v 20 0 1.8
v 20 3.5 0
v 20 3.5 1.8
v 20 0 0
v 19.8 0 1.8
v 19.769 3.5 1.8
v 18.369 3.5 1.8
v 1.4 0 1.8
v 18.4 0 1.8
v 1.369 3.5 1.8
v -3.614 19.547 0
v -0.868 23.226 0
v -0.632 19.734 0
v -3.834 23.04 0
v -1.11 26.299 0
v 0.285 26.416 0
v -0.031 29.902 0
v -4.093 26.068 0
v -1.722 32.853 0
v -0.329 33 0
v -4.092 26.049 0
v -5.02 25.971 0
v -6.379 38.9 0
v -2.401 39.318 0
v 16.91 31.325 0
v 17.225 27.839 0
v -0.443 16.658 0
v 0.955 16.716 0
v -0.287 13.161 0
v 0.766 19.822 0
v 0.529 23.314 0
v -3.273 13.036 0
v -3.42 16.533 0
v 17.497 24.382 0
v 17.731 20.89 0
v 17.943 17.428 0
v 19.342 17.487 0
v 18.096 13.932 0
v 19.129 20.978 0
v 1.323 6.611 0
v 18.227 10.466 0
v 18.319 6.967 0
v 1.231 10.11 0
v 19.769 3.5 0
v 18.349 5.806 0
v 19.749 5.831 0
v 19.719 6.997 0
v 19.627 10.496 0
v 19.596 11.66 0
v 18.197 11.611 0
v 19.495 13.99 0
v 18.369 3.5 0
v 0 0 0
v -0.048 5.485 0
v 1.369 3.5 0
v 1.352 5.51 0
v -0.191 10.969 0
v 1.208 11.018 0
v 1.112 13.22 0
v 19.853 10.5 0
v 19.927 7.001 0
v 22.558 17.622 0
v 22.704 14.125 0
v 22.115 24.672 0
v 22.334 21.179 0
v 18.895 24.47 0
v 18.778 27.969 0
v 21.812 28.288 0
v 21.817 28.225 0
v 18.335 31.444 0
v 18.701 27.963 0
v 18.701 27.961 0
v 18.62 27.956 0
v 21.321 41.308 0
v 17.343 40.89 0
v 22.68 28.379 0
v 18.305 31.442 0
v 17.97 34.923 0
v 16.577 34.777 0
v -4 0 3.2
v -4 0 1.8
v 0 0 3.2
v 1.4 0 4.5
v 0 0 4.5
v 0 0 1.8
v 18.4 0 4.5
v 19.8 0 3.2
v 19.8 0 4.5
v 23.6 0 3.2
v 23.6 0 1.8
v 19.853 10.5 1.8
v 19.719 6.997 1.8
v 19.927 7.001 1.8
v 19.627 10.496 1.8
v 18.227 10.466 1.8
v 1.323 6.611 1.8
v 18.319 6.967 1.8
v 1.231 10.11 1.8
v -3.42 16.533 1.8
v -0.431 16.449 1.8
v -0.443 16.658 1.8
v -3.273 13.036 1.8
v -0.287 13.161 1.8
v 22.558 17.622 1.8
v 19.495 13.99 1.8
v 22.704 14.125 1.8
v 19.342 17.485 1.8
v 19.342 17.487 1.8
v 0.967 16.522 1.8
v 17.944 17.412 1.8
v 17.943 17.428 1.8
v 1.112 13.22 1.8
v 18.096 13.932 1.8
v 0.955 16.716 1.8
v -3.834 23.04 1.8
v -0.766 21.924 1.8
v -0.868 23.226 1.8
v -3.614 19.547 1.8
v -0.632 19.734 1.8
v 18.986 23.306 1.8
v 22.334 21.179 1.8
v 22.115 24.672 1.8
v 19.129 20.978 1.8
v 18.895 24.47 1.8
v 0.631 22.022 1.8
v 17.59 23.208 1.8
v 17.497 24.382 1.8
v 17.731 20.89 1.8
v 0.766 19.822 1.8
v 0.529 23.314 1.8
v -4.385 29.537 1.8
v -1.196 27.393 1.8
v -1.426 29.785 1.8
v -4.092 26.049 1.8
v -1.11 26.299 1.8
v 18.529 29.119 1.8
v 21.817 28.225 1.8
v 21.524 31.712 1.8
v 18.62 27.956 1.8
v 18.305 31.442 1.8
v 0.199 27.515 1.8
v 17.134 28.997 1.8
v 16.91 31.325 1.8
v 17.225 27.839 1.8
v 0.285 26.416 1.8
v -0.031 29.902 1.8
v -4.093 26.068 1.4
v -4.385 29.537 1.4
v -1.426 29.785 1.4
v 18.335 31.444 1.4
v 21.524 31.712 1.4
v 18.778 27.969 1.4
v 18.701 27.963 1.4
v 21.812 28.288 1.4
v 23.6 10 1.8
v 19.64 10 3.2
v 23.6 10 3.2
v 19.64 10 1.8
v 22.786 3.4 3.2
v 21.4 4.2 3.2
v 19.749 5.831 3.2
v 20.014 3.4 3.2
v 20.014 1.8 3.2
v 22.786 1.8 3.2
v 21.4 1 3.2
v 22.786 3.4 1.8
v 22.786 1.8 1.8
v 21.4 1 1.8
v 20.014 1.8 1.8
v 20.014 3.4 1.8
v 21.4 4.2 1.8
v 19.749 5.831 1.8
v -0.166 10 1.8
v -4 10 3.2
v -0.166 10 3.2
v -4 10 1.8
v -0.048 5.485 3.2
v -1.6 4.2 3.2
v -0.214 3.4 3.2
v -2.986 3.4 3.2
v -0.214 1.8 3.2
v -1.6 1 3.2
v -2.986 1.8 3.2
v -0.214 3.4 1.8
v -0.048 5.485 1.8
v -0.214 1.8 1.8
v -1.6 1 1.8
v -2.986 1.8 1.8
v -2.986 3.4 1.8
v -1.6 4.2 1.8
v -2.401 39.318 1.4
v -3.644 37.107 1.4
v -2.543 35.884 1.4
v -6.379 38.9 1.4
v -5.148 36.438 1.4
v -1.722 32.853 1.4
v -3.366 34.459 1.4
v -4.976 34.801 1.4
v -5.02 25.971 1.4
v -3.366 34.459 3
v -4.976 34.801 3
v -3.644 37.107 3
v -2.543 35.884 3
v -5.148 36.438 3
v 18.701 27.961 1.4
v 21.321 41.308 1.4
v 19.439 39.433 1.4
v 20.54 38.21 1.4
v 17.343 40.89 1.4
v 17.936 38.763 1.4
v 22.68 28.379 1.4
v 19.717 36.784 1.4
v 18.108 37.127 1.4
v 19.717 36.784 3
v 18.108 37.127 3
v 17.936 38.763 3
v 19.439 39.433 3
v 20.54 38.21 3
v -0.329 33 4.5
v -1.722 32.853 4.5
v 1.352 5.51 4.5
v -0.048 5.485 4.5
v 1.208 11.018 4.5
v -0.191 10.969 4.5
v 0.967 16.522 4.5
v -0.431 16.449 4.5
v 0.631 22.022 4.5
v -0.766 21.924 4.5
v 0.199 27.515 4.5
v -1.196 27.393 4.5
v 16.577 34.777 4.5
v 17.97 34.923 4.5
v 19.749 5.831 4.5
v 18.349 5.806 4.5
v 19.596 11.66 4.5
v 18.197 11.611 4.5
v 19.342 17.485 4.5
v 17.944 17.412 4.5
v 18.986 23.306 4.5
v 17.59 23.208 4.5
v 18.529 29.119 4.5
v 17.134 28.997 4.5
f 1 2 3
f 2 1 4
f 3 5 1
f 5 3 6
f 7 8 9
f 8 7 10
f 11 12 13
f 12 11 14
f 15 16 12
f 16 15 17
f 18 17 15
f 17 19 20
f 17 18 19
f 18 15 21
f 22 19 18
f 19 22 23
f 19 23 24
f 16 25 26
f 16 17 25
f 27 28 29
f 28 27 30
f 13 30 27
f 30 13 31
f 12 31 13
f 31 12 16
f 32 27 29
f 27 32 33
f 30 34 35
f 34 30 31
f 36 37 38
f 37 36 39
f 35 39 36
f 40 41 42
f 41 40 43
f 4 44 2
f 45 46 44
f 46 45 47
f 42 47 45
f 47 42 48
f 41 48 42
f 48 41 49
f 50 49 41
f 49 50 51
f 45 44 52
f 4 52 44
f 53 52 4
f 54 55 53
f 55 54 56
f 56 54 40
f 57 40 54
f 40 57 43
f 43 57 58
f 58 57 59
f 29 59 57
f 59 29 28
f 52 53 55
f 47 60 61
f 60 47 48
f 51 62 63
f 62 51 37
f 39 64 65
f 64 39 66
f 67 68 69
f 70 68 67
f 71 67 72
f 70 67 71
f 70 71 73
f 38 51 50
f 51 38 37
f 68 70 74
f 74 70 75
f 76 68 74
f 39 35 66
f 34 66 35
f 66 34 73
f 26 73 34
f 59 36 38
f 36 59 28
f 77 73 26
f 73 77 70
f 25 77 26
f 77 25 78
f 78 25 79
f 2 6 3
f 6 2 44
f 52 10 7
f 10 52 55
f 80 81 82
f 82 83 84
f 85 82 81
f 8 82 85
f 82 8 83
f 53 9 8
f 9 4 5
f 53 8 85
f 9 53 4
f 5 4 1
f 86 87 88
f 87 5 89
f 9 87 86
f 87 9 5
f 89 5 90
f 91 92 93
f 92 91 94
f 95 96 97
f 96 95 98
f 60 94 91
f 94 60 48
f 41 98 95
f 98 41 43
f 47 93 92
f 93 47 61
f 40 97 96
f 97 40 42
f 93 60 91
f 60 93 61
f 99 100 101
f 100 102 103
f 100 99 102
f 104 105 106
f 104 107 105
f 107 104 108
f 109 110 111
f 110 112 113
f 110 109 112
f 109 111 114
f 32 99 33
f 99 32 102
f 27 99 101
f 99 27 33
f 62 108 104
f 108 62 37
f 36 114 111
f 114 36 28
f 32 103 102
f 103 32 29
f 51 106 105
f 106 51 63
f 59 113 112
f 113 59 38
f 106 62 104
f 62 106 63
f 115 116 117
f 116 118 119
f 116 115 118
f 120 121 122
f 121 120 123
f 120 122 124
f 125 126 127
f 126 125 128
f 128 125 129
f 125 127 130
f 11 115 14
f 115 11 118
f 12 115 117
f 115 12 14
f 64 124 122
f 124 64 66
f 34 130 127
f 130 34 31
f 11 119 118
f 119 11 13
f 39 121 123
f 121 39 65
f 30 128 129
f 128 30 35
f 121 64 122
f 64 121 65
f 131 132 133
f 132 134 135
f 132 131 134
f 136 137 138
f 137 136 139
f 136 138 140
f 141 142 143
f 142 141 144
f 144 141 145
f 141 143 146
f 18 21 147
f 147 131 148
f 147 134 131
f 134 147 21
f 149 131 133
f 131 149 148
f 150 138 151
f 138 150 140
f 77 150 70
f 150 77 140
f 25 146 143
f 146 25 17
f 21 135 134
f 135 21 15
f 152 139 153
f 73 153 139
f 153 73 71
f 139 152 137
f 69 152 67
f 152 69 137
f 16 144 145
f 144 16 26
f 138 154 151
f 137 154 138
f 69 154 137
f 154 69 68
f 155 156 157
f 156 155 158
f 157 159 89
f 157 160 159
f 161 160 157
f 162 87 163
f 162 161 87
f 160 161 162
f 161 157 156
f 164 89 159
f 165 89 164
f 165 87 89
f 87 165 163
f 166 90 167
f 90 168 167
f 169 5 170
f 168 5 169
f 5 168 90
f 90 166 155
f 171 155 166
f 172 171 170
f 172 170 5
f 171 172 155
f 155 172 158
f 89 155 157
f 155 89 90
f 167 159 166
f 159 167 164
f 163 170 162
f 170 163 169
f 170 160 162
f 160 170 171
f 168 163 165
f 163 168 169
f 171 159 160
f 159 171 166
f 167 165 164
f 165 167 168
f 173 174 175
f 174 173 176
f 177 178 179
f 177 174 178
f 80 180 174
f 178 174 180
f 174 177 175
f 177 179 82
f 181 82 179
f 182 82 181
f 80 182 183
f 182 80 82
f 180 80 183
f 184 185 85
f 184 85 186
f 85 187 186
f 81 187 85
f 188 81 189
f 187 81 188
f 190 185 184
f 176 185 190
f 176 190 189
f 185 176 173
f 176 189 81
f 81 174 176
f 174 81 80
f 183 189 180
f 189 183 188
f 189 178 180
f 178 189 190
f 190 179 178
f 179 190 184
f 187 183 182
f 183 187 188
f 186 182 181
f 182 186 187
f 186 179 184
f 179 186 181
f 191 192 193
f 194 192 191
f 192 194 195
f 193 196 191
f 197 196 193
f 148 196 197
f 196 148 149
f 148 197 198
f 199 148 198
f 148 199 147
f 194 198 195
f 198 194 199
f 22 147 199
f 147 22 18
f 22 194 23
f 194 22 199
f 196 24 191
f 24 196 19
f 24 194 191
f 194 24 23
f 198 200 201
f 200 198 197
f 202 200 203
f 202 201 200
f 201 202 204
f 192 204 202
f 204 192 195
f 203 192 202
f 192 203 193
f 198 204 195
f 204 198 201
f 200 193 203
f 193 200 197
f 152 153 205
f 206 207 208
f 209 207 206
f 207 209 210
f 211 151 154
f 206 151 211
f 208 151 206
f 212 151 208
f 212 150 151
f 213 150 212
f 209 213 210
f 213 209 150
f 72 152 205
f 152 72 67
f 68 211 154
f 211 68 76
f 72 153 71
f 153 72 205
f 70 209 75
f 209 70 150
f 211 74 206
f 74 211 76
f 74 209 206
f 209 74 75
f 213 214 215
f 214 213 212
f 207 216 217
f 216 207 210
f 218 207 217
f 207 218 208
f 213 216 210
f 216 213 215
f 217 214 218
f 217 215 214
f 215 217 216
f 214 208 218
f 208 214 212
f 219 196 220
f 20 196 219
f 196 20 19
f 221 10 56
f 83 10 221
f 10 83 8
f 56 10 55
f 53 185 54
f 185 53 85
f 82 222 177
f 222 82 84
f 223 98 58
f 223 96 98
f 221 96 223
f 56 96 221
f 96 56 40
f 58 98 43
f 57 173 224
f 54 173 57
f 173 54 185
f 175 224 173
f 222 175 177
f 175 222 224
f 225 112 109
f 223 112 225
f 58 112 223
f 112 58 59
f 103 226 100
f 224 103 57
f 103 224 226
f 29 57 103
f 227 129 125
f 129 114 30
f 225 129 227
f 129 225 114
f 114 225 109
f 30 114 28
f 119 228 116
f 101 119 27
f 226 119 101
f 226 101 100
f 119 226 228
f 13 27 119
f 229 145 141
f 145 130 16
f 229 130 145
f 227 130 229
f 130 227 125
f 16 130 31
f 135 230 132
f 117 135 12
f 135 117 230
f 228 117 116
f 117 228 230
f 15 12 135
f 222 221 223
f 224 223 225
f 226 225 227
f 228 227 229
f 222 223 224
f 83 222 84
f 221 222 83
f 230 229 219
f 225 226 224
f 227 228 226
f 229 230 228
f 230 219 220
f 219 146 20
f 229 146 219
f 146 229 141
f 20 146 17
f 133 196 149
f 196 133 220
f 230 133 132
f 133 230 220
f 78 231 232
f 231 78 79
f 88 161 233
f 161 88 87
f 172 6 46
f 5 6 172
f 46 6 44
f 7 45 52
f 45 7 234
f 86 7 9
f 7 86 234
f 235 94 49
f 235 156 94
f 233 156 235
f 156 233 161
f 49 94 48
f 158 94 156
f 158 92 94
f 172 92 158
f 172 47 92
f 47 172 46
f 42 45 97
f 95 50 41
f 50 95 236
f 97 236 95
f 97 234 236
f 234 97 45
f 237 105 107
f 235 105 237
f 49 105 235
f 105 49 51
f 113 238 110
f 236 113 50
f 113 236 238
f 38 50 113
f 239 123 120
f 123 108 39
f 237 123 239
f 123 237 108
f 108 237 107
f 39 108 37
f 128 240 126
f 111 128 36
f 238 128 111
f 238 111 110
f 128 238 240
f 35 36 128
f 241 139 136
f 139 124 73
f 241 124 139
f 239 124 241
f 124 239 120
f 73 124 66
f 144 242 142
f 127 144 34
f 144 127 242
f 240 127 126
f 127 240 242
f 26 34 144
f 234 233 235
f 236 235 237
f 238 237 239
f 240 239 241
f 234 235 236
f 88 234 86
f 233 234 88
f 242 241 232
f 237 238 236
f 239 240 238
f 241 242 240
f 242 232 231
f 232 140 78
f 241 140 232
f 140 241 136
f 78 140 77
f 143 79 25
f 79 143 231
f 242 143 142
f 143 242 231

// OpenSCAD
radius=332.7;
wide=18.4;
thick=1.4;
sleep_h=1.8;
sleep_w=3.5;
fix_w = 4;
fix_h = 1.4;
angle_l = 6.0;
module o_fix(offset) {
rotate(90,[0,0,1])
difference() {
cube(size=[10,fix_w,fix_h]);
translate([2.6,offset,-1])
cylinder(h=3.0,d=3.2);
}
}

module x_fix(offset_x, offset_y) {
    rotate(90,[0,0,1])
    cube(size=[13,fix_w,fix_h]);
    translate([-2.2+offset_x,10+offset_y,0])
    color("red")
    cylinder(h=3,d=2.8);
}

module track_arc() {
translate([-radius+wide,0,0]) {
rotate_extrude(angle=angle_l,convexity = 10,$fa=1)
    translate([radius-wide, 0, 0])
        square(size=[thick,4.5]);
rotate_extrude(angle=angle_l,convexity = 10,$fa=1)
    translate([radius, 0, 0])
        square(size=[thick,4.5]);

for (i=[0:1.2:angle_l-1]) {
    rotate(i,[0,0,1])
    if (i>=2.4) {
    translate([radius-wide-3,0,0])
    cube(size=[26,sleep_w,sleep_h]);
    } else {
    translate([radius-wide,0,0])
    cube(size=[20,sleep_w,sleep_h]);
    }
}
translate([radius+5.2,0,sleep_h])
o_fix(2.2);
translate([radius-wide,0,sleep_h])
o_fix(1.6);
rotate(angle_l,[0,0,1])
translate([radius-wide,-sleep_w-3,0])
x_fix(0.3,-0.4);
rotate(angle_l,[0,0,1])
translate([radius+5.4,-sleep_w-3.5,0])
x_fix(-0.3,0.0);
}
}


track_arc();
